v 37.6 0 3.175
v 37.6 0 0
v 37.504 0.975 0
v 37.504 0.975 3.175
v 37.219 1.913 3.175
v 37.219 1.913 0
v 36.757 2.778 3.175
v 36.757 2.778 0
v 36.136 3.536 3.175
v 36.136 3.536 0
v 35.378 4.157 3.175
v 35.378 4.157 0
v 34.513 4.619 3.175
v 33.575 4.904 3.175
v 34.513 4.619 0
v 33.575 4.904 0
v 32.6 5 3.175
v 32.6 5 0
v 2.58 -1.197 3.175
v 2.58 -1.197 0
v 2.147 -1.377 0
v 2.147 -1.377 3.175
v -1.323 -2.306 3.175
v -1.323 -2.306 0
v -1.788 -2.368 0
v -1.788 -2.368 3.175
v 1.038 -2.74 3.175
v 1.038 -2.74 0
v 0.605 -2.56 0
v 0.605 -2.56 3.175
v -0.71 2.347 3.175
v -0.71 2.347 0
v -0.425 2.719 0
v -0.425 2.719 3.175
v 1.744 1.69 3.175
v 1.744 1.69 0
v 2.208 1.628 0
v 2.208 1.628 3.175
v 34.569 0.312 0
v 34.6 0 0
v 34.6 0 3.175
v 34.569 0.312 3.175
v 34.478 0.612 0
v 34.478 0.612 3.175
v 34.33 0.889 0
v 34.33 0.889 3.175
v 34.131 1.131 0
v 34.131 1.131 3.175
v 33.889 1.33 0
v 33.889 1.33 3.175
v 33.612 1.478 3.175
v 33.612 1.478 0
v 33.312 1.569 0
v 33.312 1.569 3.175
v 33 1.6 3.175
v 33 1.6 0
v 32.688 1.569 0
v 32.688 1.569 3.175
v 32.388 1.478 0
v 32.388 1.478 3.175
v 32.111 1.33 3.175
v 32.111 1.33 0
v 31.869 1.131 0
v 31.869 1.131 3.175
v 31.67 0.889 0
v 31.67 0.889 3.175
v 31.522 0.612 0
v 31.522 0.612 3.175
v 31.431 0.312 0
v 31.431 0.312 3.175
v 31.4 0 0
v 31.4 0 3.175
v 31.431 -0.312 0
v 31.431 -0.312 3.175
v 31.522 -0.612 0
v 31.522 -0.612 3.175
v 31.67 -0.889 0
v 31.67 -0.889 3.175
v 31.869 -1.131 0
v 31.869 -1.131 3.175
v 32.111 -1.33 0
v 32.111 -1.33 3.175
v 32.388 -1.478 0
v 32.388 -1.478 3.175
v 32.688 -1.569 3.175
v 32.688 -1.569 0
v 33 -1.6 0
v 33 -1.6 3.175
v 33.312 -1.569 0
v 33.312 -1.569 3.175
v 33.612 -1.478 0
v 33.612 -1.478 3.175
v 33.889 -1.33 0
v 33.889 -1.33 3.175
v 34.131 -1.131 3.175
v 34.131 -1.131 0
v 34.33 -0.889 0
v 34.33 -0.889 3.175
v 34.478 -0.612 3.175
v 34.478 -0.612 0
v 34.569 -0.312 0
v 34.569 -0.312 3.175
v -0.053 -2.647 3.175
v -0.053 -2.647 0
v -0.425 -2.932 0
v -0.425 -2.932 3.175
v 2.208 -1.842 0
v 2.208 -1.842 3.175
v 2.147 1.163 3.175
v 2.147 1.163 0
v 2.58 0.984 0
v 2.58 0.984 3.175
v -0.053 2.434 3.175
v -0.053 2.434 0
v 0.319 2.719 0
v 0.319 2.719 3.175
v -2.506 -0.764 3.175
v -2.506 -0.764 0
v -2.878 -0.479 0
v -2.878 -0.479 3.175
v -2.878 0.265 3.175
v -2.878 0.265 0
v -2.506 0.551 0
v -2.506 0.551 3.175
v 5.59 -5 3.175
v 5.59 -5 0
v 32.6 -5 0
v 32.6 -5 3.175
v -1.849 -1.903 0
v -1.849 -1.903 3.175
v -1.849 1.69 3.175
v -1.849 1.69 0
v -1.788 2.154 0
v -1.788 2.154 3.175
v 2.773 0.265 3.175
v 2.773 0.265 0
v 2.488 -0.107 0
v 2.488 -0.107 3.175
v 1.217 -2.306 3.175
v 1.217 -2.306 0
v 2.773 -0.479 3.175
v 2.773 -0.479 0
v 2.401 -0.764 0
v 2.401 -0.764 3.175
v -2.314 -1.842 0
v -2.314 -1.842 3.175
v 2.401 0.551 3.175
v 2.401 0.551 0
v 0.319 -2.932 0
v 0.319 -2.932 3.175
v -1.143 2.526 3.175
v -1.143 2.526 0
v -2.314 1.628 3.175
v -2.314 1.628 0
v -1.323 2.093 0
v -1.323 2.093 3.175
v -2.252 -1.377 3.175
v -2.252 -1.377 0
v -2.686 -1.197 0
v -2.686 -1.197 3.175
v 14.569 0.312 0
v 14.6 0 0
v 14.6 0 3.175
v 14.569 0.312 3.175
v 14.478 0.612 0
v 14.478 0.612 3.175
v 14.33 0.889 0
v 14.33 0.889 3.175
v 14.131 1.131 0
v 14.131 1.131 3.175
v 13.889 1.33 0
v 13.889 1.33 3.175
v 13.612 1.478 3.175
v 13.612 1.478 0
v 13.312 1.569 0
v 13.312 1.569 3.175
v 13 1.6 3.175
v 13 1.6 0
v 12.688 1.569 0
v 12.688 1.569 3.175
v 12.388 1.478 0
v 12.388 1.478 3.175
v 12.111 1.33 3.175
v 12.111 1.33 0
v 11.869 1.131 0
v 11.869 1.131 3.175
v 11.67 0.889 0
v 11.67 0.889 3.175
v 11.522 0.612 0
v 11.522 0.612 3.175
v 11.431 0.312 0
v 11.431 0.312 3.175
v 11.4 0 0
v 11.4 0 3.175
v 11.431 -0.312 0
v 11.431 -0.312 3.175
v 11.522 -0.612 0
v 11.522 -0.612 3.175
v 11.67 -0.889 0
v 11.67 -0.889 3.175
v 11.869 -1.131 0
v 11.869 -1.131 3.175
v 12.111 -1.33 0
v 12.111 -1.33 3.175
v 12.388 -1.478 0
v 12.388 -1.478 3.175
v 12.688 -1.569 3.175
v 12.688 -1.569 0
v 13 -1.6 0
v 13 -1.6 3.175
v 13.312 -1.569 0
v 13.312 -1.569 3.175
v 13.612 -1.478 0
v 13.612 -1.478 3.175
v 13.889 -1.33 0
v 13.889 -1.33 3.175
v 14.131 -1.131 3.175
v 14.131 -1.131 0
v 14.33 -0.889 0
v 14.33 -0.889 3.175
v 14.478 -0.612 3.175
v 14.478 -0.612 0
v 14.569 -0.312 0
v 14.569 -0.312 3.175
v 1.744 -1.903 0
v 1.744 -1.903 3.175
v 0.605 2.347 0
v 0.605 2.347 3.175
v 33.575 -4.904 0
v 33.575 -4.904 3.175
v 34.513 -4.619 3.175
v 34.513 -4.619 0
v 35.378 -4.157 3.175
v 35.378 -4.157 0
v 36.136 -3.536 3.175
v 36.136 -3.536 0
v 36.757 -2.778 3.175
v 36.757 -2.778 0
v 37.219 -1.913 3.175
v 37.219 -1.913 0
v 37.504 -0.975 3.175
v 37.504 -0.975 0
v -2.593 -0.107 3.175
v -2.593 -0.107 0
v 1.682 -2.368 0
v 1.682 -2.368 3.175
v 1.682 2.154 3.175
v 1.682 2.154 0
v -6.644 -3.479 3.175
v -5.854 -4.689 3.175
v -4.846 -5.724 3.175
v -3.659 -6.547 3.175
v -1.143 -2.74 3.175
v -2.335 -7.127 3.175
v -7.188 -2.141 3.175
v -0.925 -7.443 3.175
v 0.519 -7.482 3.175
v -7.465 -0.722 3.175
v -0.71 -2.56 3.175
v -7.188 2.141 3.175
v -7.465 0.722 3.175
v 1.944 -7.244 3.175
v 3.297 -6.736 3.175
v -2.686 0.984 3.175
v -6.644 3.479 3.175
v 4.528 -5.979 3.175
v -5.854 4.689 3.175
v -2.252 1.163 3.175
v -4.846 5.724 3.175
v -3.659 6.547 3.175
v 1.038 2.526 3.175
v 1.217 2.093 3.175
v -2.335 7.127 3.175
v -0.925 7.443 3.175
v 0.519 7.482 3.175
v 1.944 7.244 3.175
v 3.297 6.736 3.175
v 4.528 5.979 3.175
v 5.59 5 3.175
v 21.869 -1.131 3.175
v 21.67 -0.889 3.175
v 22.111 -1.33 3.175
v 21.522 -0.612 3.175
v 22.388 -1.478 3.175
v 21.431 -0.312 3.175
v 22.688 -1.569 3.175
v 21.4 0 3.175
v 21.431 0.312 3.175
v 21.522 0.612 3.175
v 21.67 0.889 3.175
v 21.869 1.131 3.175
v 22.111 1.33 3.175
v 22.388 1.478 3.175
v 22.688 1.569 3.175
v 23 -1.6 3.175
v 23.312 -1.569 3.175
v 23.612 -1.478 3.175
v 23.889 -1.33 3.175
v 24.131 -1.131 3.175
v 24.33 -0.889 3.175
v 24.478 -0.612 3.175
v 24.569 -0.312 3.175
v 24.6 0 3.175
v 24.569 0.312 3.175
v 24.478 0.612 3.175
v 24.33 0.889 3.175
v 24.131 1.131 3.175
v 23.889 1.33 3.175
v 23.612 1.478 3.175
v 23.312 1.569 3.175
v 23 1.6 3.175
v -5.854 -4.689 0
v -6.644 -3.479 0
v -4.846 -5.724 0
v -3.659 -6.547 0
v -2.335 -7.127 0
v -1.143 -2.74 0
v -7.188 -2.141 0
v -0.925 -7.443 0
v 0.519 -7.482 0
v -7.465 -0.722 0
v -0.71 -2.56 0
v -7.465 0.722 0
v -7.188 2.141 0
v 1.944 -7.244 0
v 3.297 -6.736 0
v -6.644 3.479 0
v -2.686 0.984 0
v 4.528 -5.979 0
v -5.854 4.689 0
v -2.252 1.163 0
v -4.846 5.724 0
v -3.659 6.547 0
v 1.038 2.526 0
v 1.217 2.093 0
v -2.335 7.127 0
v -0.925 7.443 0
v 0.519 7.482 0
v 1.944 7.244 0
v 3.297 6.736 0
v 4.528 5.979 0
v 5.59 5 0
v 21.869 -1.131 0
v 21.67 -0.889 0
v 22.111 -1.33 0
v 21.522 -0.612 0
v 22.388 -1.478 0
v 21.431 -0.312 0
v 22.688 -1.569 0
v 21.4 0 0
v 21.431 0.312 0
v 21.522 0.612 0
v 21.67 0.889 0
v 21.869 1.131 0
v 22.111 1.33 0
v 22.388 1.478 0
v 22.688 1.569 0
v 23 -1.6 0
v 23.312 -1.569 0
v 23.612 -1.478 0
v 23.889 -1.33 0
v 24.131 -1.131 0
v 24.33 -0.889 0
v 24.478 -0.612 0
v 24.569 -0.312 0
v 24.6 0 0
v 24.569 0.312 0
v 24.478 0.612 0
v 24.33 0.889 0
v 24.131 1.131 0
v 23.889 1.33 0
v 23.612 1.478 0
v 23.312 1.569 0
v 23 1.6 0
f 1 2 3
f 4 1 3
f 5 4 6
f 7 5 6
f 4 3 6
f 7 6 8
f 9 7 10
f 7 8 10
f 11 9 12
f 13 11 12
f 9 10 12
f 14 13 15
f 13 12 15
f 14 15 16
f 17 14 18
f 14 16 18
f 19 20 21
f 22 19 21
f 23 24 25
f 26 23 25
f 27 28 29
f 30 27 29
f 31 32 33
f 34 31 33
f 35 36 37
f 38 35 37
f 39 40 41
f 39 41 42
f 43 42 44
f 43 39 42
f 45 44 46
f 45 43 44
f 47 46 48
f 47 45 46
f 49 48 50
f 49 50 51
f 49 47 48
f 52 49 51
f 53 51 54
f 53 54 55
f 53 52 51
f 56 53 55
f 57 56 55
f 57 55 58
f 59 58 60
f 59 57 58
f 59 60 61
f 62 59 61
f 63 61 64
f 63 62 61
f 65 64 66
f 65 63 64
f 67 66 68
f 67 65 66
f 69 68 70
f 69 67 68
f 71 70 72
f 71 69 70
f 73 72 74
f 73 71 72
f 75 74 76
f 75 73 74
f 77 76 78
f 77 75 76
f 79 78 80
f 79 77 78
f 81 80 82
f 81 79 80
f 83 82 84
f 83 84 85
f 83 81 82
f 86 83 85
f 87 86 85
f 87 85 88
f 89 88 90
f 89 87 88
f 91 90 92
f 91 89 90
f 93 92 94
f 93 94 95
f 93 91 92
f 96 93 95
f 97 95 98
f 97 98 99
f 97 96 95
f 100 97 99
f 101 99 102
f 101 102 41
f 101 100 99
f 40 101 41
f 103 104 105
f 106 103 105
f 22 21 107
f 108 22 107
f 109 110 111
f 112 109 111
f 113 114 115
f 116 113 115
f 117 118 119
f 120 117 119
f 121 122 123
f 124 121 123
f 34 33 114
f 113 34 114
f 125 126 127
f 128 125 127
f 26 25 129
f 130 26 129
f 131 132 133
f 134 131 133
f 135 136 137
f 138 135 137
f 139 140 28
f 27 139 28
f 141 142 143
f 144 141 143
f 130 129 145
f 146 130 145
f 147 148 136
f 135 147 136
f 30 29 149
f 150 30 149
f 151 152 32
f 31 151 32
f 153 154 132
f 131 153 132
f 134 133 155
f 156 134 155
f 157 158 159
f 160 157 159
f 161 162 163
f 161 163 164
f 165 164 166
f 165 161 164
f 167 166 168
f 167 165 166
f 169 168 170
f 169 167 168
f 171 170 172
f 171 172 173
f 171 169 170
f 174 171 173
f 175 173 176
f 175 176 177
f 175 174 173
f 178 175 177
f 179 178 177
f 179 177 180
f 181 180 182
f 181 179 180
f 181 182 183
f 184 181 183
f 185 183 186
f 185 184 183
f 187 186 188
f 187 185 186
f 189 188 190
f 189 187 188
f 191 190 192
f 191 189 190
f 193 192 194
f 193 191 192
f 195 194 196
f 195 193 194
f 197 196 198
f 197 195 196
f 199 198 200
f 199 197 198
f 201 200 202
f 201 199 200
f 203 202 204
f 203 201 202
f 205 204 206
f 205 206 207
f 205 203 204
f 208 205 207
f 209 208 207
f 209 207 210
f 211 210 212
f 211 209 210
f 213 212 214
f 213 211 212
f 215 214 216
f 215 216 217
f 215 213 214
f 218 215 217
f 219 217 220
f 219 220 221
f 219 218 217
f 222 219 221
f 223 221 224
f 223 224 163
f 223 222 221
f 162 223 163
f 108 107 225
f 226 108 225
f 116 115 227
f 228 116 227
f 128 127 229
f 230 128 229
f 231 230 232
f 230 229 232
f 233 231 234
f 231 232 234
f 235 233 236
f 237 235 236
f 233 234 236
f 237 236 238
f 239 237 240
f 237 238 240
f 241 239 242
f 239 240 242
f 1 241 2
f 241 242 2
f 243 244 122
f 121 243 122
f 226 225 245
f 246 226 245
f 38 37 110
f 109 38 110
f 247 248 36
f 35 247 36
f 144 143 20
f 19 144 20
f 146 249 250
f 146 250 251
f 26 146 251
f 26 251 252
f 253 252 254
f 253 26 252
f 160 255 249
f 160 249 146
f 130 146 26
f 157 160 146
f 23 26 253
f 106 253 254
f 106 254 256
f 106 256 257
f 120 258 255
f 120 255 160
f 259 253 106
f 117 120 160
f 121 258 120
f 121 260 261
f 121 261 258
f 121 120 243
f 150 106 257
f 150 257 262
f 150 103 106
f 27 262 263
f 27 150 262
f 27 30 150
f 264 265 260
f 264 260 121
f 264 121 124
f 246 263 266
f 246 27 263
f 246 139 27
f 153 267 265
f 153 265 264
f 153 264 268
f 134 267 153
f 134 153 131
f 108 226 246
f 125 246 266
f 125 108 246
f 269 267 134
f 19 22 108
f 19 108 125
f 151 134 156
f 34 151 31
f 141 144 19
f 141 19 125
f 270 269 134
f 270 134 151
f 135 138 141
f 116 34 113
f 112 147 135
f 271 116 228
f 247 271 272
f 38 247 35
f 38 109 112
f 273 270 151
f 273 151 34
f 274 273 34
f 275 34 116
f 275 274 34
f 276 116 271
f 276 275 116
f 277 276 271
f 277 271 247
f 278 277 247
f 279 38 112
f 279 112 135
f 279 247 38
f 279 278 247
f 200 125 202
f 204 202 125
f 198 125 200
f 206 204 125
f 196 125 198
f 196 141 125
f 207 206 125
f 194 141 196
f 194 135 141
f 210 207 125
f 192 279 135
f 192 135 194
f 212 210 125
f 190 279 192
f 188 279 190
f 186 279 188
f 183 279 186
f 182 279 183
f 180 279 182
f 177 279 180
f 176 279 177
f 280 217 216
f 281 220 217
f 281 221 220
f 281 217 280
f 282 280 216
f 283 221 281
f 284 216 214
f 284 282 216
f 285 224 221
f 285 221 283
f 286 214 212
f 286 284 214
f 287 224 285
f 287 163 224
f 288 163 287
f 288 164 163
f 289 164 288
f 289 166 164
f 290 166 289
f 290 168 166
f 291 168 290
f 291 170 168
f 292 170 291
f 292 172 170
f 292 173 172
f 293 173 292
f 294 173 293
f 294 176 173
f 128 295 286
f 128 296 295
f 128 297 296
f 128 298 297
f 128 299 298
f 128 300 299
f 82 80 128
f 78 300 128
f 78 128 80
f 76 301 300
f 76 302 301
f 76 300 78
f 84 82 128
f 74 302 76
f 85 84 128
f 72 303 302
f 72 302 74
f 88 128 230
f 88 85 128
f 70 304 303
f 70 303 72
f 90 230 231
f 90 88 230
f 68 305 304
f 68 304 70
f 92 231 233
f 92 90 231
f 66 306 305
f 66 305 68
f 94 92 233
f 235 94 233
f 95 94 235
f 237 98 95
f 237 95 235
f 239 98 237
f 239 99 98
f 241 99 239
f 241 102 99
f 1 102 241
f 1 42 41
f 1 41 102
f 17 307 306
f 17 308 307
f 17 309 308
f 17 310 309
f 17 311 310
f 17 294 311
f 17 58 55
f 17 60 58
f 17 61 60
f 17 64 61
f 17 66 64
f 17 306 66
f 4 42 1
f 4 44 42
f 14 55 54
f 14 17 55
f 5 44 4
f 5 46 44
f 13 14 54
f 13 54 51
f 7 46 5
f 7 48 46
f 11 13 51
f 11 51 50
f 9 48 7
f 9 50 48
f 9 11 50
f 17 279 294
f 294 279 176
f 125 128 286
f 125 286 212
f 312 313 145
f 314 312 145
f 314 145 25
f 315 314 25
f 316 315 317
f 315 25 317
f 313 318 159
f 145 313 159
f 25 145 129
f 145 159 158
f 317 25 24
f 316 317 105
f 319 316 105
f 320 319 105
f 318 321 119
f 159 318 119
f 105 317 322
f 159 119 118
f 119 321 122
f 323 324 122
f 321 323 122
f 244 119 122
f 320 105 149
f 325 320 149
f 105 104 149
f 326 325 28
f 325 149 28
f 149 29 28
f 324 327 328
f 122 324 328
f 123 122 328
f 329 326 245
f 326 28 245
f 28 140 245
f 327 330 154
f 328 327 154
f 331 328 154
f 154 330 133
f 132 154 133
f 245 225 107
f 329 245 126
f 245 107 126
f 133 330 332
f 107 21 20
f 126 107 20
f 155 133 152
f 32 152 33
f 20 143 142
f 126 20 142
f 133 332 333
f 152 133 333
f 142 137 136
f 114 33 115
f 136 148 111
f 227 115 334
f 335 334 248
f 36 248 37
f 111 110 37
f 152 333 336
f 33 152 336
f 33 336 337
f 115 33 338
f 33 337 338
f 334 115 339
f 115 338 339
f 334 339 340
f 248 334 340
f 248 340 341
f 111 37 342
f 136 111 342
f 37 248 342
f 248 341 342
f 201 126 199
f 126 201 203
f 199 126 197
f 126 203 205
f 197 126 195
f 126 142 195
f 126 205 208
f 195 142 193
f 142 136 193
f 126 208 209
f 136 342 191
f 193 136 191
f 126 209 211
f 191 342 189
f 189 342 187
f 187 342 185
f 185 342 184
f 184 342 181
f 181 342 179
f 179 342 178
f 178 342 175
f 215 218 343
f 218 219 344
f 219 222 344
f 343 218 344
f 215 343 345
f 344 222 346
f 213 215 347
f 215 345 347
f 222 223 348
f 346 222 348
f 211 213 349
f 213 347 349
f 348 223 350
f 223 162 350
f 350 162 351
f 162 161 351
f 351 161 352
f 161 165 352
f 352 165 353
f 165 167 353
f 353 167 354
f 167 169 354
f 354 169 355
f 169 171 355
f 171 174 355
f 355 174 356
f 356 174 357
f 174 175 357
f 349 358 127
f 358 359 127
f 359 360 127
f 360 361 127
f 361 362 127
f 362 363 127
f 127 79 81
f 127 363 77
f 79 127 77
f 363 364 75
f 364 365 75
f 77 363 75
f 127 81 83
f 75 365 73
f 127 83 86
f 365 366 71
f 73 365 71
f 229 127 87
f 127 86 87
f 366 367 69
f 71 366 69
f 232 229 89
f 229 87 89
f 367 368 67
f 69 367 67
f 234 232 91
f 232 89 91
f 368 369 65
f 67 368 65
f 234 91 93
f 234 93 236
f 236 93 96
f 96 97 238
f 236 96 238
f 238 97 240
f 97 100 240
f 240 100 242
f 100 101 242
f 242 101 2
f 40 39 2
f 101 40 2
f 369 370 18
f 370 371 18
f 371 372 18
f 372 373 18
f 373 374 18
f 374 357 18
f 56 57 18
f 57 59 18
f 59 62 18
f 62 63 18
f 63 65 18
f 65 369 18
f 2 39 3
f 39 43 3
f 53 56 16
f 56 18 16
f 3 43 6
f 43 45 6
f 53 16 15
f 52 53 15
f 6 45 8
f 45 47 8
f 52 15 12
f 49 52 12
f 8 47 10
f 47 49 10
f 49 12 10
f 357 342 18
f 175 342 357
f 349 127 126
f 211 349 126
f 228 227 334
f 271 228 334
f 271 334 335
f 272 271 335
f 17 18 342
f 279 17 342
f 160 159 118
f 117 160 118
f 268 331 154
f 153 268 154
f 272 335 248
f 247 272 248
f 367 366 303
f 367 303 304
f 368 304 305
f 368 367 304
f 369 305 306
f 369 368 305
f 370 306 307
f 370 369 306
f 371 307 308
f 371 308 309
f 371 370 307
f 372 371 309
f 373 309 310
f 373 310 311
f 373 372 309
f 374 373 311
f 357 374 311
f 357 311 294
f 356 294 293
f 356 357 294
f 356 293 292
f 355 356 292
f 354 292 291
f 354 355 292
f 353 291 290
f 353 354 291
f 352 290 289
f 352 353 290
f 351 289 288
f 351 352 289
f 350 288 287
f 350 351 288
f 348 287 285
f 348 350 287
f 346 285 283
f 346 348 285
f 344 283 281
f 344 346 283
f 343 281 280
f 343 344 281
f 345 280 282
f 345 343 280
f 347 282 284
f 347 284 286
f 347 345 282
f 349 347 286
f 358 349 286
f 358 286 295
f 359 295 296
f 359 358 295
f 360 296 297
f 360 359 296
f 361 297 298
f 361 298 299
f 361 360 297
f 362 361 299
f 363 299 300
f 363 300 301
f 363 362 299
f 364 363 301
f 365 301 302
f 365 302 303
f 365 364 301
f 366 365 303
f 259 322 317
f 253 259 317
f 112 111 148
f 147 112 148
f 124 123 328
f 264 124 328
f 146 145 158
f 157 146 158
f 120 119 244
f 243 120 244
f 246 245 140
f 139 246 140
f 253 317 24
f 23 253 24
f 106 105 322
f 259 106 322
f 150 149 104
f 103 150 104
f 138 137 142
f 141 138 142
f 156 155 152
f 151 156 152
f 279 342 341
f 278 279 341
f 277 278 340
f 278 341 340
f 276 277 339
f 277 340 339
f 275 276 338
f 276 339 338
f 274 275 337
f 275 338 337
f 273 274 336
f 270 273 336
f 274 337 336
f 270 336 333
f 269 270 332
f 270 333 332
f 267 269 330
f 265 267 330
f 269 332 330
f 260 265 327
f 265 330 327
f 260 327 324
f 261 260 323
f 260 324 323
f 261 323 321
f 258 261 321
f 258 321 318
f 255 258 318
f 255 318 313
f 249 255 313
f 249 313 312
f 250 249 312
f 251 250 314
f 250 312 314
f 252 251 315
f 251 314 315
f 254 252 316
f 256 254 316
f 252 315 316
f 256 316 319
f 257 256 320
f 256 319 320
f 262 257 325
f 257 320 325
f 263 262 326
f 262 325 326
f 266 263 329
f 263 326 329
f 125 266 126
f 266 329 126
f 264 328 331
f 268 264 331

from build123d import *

# Parameters (mm, degrees)
F0_R     = 1.6
F1_DEPTH = 3.175


# Not quite as in the source:
# - a feature names something its author has since deleted; it is built from what else it names


with BuildPart() as f1:
    # F0 (on Top) → F1 (new body)
    with BuildSketch(Plane.XY):
        with BuildLine():
            Line((32.6, 5), (5.5901699437, 5))
            ThreePointArc((5.5901699437, 5), (-7.5, 0), (5.5901699437, -5))
            Line((5.5901699437, -5), (32.6, -5))
            ThreePointArc((32.6, -5), (36.1355339059, -3.5355339059), (37.6, 0))
            ThreePointArc((37.6, 0), (36.1355339059, 3.5355339059), (32.6, 5))
        make_face()
        Polygon((-0.4246363361, 2.7189872831), (-0.0526366882, 2.4335419138), (0.3193629596, 2.7189872831), (0.6048083289, 2.3469876353), (1.038011094, 2.5264260959), (1.2174495546, 2.0932233308), (1.6823333844, 2.154426448), (1.7435365017, 1.6895426182), (2.2084203316, 1.6283395009), (2.1472172143, 1.163455671), (2.5804199794, 0.9840172105), (2.4009815188, 0.5508144453), (2.7729811667, 0.265369076), (2.4875357974, -0.1066305718), (2.7729811667, -0.4786302196), (2.4009815188, -0.7640755889), (2.5804199794, -1.197278354), (2.1472172143, -1.3767168146), (2.2084203316, -1.8416006445), (1.7435365017, -1.9028037618), (1.6823333844, -2.3676875916), (1.2174495546, -2.3064844743), (1.038011094, -2.7396872394), (0.6048083289, -2.5602487789), (0.3193629596, -2.9322484267), (-0.0526366882, -2.6468030574), (-0.4246363361, -2.9322484267), (-0.7100817054, -2.5602487789), (-1.1432844705, -2.7396872394), (-1.322722931, -2.3064844743), (-1.7876067609, -2.3676875916), (-1.8488098782, -1.9028037618), (-2.3136937081, -1.8416006445), (-2.2524905908, -1.3767168146), (-2.6856933559, -1.197278354), (-2.5062548953, -0.7640755889), (-2.8782545432, -0.4786302196), (-2.5928091739, -0.1066305718), (-2.8782545432, 0.265369076), (-2.5062548953, 0.5508144453), (-2.6856933559, 0.9840172105), (-2.2524905908, 1.163455671), (-2.3136937081, 1.6283395009), (-1.8488098782, 1.6895426182), (-1.7876067609, 2.154426448), (-1.322722931, 2.0932233308), (-1.1432844705, 2.5264260959), (-0.7100817054, 2.3469876353), align=None, mode=Mode.SUBTRACT)
        with Locations((13, 0)):
            Circle(F0_R, mode=Mode.SUBTRACT)
        with Locations((23, 0)):
            Circle(F0_R, mode=Mode.SUBTRACT)
        with Locations((33, 0)):
            Circle(F0_R, mode=Mode.SUBTRACT)
    extrude(amount=F1_DEPTH)


solid = f1.part
